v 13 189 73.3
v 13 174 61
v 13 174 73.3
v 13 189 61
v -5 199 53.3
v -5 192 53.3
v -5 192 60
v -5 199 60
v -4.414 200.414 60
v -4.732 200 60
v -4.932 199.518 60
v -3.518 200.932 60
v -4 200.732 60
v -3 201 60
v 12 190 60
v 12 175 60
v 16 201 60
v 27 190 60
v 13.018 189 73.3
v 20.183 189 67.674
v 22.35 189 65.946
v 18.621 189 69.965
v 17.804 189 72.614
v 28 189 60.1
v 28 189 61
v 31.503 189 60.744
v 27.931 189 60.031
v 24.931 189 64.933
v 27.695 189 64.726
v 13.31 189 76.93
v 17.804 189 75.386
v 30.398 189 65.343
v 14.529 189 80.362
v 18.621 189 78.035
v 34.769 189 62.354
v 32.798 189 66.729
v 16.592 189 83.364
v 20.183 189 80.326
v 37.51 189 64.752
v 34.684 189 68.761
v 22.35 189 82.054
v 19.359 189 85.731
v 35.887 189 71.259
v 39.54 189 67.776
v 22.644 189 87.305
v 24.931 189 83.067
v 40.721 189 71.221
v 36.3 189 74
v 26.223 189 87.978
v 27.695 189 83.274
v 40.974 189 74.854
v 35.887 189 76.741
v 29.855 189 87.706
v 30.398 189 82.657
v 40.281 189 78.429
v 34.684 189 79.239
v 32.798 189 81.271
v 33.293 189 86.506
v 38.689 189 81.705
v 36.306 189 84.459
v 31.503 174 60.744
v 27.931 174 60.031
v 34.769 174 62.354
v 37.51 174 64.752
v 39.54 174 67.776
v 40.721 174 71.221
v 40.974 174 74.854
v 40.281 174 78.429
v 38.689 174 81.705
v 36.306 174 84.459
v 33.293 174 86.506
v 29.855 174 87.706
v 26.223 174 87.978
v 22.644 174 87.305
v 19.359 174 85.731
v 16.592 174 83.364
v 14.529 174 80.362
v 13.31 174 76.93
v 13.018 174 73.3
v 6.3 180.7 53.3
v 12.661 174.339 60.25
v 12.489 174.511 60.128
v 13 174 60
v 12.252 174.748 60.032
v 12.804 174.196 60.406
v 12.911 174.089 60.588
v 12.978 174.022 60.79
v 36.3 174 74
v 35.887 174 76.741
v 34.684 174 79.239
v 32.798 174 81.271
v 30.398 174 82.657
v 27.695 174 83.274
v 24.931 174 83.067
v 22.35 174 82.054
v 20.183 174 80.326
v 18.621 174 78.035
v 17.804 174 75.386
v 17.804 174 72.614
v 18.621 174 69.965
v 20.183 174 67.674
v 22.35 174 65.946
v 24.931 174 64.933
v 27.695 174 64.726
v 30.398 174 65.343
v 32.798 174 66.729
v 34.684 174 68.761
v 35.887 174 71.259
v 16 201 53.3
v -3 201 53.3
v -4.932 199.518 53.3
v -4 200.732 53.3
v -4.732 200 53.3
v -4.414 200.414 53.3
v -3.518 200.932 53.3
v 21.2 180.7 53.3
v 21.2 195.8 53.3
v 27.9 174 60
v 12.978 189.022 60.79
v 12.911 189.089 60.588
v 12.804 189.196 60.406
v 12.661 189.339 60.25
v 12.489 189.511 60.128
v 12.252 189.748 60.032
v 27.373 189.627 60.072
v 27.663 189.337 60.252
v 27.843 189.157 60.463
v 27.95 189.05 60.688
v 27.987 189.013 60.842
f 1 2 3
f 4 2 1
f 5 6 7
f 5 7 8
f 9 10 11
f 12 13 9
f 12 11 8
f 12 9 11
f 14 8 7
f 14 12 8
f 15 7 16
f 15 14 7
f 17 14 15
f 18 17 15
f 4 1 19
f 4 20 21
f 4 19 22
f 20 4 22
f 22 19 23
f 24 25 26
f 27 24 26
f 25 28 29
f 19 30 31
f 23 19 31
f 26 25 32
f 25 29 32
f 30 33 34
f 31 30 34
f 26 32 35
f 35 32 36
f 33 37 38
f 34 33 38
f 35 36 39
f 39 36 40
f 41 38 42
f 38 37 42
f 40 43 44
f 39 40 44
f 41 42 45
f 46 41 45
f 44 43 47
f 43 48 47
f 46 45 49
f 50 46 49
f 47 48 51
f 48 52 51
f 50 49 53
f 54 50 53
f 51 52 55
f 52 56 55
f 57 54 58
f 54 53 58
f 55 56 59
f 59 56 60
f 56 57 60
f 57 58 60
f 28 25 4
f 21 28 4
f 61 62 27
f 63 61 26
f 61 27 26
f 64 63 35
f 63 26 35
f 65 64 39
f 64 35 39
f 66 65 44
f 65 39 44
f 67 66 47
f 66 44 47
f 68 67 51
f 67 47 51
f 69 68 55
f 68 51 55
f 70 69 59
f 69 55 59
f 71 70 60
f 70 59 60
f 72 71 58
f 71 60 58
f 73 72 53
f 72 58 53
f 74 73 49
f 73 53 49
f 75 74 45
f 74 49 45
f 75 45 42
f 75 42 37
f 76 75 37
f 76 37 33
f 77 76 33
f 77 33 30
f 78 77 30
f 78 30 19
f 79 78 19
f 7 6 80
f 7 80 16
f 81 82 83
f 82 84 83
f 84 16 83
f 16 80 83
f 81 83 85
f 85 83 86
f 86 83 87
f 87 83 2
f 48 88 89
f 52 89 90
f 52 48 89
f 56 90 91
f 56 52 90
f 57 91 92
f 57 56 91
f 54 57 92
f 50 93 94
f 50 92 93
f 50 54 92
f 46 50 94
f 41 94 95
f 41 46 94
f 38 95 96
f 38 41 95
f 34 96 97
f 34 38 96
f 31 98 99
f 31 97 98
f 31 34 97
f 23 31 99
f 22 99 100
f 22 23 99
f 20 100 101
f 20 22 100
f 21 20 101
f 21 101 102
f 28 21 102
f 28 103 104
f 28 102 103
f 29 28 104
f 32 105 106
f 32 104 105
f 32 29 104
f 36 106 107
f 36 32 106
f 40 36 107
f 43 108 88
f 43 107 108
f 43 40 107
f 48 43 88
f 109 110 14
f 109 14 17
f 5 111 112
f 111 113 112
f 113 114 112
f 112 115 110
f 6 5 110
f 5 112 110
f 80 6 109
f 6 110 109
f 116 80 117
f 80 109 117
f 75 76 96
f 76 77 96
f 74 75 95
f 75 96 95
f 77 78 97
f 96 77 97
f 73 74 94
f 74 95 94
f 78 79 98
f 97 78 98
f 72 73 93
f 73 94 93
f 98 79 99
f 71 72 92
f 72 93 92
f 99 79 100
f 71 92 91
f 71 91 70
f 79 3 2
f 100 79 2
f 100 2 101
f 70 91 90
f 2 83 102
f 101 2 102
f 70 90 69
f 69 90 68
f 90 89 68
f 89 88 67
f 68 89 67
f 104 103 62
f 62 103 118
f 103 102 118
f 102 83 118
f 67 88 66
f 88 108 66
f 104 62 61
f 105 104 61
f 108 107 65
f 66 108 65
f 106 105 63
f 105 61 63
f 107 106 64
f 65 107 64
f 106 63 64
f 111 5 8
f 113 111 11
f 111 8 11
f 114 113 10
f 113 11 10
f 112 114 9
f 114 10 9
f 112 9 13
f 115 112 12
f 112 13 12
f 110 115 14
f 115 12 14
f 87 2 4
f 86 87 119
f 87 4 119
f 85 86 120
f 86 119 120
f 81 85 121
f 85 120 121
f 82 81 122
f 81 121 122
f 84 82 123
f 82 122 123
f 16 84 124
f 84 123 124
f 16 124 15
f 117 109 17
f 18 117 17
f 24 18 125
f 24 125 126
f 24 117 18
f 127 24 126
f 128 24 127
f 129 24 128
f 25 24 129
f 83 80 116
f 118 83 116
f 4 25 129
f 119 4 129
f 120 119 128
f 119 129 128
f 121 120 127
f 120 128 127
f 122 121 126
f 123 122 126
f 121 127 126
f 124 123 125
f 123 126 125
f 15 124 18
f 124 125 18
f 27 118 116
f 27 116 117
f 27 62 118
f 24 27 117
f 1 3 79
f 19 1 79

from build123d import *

# Parameters (mm, degrees)
CYLINDER013_R     = 9.3
CYLINDER013_DEPTH = 30
BOX004_W          = 38
BOX004_H          = 16
BOX004_DEPTH      = 16
FILLET002_R       = 1
BOX003_W          = 20
BOX003_H          = 33
BOX003_DEPTH      = 16
FILLET001_R       = 1
BOX002_W          = 33
BOX002_H          = 27
BOX002_DEPTH      = 20
FILLET_R          = 2
CHAMFER003_SIZE   = 12
CHAMFER004_SIZE   = 18
CHAMFER005_SIZE   = 6.7
CHAMFER006_SIZE   = 6.8
CYLINDER012_R     = 9.3
CYLINDER012_DEPTH = 30
CYLINDER011_R     = 14
CYLINDER011_DEPTH = 15


with BuildPart() as cilindro013:
    # Cylinder013 → Cylinder013 (new body)
    with BuildSketch(Plane(origin=(27, 199, 74), x_dir=(1, 0, 0), z_dir=(0, -1, 0))):
        Circle(CYLINDER013_R)
    extrude(amount=CYLINDER013_DEPTH)


with BuildPart() as fillet002:
    # Box004 → Box004 (new body)
    with BuildSketch(Plane(origin=(-7, 189, 60), x_dir=(1, 0, 0), z_dir=(0, 0, 1))):
        with Locations((19, 8)):
            Rectangle(BOX004_W, BOX004_H)
    extrude(amount=BOX004_DEPTH)

    # Fillet002
    fillet002_edges = [fillet002.edges().sort_by_distance(p)[0] for p in [
        (12, 189, 60),
    ]]
    fillet(fillet002_edges, radius=FILLET002_R)


with BuildPart() as fillet001:
    # Box003 → Box003 (new body)
    with BuildSketch(Plane(origin=(-7, 172, 60), x_dir=(1, 0, 0), z_dir=(0, 0, 1))):
        with Locations((10, 16.5)):
            Rectangle(BOX003_W, BOX003_H)
    extrude(amount=BOX003_DEPTH)

    # Fillet001
    fillet001_edges = [fillet001.edges().sort_by_distance(p)[0] for p in [
        (13, 188.5, 60),
    ]]
    fillet(fillet001_edges, radius=FILLET001_R)


with BuildPart() as cut006:
    # Box002 → Box002 (new body)
    with BuildSketch(Plane(origin=(-5, 174, 53.3), x_dir=(1, 0, 0), z_dir=(0, 0, 1))):
        with Locations((16.5, 13.5)):
            Rectangle(BOX002_W, BOX002_H)
    extrude(amount=BOX002_DEPTH)

    # Fillet
    fillet_edges = [cut006.edges().sort_by_distance(p)[0] for p in [
        (-5, 201, 63.3),
    ]]
    fillet(fillet_edges, radius=FILLET_R)

    # Chamfer003
    chamfer003_edges = [cut006.edges().sort_by_distance(p)[0] for p in [
        (28, 201, 63.3),
    ]]
    chamfer(chamfer003_edges, length=CHAMFER003_SIZE)

    # Chamfer004
    chamfer004_edges = [cut006.edges().sort_by_distance(p)[0] for p in [
        (-5, 174, 63.3),
    ]]
    chamfer(chamfer004_edges, length=CHAMFER004_SIZE)

    # Chamfer005
    chamfer005_edges = [cut006.edges().sort_by_distance(p)[0] for p in [
        (20.5, 174, 53.3),
    ]]
    chamfer(chamfer005_edges, length=CHAMFER005_SIZE)

    # Chamfer006
    chamfer006_edges = [cut006.edges().sort_by_distance(p)[0] for p in [
        (28, 184.85, 53.3),
    ]]
    chamfer(chamfer006_edges, length=CHAMFER006_SIZE)

    # Cut004: cut Fillet001
    add(fillet001.part, mode=Mode.SUBTRACT)

    # Cut005: cut Fillet002
    add(fillet002.part, mode=Mode.SUBTRACT)

    # Cut006: cut Cilindro013
    add(cilindro013.part, mode=Mode.SUBTRACT)


with BuildPart() as cilindro012:
    # Cylinder012 → Cylinder012 (new body)
    with BuildSketch(Plane(origin=(27, 199, 74), x_dir=(1, 0, 0), z_dir=(0, -1, 0))):
        Circle(CYLINDER012_R)
    extrude(amount=CYLINDER012_DEPTH)


with BuildPart() as inductive_probe_mount:
    # Cylinder011 → Cylinder011 (new body)
    with BuildSketch(Plane(origin=(27, 189, 74), x_dir=(1, 0, 0), z_dir=(0, -1, 0))):
        Circle(CYLINDER011_R)
    extrude(amount=CYLINDER011_DEPTH)

    # Cut003: cut Cilindro012
    add(cilindro012.part, mode=Mode.SUBTRACT)

    # Fusion005: union Cut006
    add(cut006.part)


solid = inductive_probe_mount.part
